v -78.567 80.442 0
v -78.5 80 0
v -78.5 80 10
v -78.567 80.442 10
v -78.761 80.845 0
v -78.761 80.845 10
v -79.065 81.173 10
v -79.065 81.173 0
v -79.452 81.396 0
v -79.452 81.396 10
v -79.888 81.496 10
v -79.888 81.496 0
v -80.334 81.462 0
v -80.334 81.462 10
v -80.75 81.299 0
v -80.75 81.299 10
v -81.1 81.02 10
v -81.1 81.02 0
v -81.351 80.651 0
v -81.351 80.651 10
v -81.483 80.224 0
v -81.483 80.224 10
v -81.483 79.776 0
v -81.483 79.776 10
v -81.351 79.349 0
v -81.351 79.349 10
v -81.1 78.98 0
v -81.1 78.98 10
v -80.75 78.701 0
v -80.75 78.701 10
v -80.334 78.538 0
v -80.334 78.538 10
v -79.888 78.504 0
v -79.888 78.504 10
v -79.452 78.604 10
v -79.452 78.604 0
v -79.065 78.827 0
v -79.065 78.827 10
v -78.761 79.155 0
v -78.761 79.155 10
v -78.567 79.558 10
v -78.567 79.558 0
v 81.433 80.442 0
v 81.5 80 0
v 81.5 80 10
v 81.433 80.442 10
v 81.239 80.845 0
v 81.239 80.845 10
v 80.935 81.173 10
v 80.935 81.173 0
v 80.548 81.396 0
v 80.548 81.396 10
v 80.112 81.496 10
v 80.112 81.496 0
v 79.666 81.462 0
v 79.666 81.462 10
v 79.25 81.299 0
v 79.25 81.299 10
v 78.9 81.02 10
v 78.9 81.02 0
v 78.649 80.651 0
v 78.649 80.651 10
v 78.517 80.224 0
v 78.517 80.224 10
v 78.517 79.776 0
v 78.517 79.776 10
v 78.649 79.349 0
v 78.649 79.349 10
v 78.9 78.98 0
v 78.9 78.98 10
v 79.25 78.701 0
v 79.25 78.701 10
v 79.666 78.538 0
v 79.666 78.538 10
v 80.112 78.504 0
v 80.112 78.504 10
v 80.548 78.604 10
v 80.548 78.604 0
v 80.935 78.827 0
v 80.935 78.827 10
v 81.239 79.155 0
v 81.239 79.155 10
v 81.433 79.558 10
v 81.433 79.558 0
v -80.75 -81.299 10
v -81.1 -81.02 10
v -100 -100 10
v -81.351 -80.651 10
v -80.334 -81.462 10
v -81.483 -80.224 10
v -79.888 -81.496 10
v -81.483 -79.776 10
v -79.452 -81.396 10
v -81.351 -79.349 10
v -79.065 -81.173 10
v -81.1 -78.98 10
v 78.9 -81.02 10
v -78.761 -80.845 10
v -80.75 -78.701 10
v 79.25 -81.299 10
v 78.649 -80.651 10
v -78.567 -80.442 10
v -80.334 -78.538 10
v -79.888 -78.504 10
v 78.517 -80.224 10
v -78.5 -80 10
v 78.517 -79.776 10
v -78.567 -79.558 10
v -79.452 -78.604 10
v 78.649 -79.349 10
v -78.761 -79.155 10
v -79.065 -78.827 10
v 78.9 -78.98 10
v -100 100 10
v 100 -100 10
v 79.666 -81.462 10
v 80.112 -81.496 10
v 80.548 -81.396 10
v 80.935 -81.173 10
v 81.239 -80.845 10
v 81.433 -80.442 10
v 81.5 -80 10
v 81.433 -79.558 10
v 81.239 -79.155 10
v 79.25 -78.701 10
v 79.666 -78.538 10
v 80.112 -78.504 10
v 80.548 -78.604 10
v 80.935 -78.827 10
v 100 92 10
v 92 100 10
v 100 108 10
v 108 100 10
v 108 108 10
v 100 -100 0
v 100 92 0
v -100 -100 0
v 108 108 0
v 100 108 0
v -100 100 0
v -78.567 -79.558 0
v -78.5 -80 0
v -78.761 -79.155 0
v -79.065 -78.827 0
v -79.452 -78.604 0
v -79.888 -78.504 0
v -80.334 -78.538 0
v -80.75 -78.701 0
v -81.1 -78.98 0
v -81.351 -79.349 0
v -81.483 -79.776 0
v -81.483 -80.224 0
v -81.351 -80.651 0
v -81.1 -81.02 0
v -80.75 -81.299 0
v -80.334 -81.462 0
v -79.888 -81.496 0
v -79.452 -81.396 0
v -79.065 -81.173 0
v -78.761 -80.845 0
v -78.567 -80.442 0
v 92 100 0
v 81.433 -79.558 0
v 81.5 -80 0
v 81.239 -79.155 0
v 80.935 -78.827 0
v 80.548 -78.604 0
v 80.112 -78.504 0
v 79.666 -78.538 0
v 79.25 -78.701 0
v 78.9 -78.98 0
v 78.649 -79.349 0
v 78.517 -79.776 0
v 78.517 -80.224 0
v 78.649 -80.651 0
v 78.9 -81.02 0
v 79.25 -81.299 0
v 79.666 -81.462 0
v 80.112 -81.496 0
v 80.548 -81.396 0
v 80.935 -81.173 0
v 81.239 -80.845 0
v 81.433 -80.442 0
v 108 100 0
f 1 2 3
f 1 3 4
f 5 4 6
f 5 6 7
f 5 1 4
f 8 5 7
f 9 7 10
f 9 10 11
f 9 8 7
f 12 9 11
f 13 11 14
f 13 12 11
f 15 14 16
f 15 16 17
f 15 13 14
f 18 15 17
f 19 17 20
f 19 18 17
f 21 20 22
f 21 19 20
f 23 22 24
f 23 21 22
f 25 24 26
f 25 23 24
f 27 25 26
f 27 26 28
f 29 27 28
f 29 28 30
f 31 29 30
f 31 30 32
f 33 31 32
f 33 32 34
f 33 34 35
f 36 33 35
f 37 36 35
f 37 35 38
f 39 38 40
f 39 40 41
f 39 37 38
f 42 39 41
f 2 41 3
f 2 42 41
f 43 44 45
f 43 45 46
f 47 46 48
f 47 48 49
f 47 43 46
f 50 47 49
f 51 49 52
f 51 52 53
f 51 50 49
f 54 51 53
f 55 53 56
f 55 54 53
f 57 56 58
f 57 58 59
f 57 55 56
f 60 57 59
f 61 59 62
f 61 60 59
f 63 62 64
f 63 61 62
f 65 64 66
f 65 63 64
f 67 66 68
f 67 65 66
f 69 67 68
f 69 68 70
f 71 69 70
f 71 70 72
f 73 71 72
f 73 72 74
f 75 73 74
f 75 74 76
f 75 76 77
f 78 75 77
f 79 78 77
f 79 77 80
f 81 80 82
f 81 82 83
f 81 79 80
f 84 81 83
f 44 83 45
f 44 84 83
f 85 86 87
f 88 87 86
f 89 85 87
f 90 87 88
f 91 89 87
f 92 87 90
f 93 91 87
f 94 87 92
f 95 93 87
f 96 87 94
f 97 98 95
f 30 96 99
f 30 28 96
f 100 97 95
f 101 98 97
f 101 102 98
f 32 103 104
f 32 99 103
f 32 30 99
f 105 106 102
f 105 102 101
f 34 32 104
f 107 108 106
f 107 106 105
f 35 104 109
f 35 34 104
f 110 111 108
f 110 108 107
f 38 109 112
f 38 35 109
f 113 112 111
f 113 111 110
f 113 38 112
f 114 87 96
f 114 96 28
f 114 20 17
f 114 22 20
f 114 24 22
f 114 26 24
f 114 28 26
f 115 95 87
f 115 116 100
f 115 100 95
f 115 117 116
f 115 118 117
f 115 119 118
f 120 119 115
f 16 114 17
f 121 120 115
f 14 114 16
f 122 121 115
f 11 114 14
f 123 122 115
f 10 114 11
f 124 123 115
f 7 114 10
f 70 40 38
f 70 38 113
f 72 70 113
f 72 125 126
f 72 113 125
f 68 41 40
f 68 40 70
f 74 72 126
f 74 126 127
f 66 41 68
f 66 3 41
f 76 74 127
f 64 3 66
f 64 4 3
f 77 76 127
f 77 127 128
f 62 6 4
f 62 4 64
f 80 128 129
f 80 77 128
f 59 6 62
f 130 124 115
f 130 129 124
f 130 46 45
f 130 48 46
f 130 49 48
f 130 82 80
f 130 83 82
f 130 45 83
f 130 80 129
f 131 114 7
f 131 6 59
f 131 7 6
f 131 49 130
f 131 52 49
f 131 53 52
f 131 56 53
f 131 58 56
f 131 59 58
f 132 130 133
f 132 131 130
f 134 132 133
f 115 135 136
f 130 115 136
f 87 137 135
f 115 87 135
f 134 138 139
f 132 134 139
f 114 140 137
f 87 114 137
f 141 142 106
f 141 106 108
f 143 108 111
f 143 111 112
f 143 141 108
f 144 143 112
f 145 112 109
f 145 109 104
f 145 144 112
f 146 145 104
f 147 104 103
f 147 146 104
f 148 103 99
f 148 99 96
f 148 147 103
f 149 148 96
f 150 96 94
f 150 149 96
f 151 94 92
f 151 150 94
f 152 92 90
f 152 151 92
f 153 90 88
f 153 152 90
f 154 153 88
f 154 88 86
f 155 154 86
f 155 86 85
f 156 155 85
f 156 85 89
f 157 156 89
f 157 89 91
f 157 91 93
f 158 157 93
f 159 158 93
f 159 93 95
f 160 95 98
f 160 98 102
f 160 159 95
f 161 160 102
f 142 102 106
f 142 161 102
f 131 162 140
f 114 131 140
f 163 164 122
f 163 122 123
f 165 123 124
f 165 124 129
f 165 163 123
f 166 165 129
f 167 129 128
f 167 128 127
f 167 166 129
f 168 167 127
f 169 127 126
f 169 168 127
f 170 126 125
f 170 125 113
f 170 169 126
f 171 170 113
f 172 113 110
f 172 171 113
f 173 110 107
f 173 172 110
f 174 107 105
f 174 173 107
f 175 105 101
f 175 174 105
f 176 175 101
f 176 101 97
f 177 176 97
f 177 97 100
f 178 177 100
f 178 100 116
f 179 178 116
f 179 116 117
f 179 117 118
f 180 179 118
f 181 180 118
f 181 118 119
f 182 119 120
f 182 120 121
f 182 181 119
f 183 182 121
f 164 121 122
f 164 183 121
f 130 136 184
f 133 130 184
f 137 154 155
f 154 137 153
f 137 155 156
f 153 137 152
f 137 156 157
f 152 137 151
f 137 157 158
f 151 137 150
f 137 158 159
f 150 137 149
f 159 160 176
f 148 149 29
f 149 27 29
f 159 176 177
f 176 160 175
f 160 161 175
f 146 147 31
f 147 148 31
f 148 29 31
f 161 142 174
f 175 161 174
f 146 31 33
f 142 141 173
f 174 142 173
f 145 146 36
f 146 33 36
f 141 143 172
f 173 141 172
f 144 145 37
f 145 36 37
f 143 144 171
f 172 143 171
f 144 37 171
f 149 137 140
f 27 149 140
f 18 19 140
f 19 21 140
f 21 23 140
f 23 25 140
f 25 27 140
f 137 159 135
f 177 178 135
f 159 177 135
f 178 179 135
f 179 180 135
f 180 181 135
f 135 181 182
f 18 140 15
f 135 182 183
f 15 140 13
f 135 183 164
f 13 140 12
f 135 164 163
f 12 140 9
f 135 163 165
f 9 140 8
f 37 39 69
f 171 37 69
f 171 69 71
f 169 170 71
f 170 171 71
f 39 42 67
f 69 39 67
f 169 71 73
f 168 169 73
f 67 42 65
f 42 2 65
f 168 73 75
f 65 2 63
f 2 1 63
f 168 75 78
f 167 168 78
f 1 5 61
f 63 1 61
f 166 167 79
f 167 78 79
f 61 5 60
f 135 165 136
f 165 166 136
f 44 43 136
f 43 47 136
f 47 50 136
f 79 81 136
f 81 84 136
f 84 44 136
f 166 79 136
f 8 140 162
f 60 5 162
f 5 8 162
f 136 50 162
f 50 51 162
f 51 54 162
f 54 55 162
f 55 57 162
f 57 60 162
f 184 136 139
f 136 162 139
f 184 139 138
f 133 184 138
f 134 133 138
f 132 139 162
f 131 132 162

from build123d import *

# Parameters (mm, degrees)
F0_W     = 184
F0_H     = 184
F0_R     = 1.5
F0_W_2   = 8
F0_H_2   = 8
F1_DEPTH = 10


with BuildPart() as f1:
    # F0 (on Top) → F1 (new body)
    with BuildSketch(Plane.XY):
        Polygon((100, 92), (92, 92), (92, 100), (-100, 100), (-100, -100), (100, -100), align=None)
        Rectangle(F0_W, F0_H, mode=Mode.SUBTRACT)
        Rectangle(F0_W, F0_H)
        with Locations((-80, -80)):
            Circle(F0_R, mode=Mode.SUBTRACT)
        with Locations((80, -80)):
            Circle(F0_R, mode=Mode.SUBTRACT)
        with Locations((-80, 80)):
            Circle(F0_R, mode=Mode.SUBTRACT)
        with Locations((80, 80)):
            Circle(F0_R, mode=Mode.SUBTRACT)
        Polygon((100, 100), (100, 92), (108, 100), (108, 108), (100, 108), (92, 100), align=None)
        with Locations((96, 96)):
            Rectangle(F0_W_2, F0_H_2)
    extrude(amount=F1_DEPTH)


solid = f1.part
